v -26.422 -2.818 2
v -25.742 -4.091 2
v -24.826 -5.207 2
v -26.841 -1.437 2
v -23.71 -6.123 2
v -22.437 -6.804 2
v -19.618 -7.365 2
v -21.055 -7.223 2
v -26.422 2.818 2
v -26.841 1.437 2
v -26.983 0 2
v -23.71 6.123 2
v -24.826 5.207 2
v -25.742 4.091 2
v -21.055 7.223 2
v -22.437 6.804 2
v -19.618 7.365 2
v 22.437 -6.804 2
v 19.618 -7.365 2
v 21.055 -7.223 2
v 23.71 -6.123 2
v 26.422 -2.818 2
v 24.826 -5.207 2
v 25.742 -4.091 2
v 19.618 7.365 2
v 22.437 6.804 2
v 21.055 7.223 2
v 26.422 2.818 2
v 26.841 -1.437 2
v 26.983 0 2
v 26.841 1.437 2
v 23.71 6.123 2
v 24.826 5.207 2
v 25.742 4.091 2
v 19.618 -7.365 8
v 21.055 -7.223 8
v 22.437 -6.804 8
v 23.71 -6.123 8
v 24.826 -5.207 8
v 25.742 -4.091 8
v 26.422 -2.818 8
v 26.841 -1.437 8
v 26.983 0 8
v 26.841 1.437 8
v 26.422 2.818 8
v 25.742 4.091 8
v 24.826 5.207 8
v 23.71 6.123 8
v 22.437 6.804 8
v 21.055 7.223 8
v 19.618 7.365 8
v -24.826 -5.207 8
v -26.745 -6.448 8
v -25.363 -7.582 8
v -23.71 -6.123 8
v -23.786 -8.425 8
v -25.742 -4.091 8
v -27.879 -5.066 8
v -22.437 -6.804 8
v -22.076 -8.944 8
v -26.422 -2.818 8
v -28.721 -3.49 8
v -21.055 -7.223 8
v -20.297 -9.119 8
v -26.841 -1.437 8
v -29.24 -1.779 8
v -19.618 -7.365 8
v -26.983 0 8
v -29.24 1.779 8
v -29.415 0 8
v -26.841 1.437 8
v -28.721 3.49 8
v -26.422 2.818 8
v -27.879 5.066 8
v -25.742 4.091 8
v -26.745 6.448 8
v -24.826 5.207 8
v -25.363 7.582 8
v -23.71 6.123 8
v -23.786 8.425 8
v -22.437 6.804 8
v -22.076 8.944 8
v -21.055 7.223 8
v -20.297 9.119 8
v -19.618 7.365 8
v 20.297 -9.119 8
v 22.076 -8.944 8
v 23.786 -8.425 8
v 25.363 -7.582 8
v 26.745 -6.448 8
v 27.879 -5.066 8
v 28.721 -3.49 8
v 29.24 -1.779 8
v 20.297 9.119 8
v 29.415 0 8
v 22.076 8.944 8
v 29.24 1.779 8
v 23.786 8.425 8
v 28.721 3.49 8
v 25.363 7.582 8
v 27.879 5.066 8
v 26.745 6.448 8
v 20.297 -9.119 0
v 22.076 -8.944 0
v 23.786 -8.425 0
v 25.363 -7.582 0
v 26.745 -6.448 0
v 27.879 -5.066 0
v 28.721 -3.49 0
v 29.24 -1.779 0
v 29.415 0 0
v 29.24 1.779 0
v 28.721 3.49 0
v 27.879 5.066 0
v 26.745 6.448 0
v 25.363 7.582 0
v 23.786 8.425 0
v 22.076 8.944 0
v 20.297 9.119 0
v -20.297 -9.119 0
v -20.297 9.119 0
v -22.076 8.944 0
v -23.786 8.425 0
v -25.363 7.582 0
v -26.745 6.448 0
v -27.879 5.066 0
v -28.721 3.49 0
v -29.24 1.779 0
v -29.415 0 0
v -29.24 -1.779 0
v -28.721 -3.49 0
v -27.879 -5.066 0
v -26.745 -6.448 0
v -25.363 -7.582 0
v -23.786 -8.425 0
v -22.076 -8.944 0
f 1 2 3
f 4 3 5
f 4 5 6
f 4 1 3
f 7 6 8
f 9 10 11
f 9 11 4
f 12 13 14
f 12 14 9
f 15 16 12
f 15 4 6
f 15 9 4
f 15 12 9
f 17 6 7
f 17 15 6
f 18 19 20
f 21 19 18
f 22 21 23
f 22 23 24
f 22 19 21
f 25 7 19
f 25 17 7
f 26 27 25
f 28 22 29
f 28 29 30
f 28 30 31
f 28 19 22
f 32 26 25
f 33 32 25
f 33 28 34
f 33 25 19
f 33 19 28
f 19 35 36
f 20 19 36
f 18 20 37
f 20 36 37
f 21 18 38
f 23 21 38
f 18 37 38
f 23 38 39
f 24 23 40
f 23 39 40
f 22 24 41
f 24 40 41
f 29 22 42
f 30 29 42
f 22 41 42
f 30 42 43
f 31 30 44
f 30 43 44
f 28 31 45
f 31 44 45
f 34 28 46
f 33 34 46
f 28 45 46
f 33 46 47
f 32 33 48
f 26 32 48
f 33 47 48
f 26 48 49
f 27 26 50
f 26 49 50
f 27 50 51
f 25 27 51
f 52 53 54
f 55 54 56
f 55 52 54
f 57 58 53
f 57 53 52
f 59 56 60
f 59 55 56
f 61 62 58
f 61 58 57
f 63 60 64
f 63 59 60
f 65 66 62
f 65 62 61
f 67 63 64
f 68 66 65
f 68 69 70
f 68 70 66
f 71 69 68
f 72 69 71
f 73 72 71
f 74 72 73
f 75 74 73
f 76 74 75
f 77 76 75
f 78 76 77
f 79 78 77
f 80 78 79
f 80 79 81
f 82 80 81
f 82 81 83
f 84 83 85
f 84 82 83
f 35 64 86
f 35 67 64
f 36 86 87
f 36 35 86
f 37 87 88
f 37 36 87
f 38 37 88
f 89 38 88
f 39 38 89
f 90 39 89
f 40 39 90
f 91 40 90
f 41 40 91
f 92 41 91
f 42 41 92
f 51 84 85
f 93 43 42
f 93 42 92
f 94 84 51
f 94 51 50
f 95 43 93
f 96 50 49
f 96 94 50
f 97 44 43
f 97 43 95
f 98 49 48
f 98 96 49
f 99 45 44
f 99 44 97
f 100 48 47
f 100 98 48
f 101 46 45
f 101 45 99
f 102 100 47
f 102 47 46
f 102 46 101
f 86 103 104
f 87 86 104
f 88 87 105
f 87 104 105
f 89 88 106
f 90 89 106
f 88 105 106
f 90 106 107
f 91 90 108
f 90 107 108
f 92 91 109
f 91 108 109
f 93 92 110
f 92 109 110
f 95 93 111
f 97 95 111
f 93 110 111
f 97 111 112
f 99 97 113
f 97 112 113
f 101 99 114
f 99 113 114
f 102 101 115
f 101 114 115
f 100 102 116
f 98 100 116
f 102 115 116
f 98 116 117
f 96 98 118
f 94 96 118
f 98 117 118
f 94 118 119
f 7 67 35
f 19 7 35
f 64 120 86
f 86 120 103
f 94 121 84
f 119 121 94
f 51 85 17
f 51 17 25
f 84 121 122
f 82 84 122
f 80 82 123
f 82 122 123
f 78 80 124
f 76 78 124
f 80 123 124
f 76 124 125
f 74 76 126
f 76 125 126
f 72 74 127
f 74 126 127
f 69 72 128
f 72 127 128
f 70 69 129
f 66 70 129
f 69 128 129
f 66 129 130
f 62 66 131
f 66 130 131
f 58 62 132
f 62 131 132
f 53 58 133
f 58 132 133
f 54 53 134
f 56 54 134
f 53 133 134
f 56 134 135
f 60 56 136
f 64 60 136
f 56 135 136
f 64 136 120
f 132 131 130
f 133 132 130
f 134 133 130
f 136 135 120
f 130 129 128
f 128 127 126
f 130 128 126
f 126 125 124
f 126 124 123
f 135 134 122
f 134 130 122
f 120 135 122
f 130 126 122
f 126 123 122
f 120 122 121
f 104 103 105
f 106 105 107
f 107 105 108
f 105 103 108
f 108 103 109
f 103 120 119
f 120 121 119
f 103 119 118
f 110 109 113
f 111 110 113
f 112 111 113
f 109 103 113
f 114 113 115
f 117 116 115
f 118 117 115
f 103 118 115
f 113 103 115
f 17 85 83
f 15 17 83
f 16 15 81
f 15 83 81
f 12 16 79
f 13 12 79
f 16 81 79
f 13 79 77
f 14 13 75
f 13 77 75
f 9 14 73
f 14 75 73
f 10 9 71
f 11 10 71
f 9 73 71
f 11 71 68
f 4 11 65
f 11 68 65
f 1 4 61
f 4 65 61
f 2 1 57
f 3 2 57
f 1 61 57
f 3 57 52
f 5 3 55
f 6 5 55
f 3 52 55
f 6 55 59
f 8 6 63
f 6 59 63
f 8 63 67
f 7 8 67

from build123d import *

# Parameters (mm, degrees)
F0_W     = 40.593308
F0_H     = 18.237574
F1_DEPTH = 8
F2_W     = 39.236986
F2_H     = 14.72901
F3_DEPTH = 6


with BuildPart() as f1:
    # F0 (on Top) → F1 (new body)
    with BuildSketch(Plane.XY):
        Rectangle(F0_W, F0_H)
        with BuildLine():
            Line((20.296654, 9.118787), (20.296654, -9.118787))
            ThreePointArc((20.296654, -9.118787), (29.415441, 0), (20.296654, 9.118787))
        make_face()
        with BuildLine():
            ThreePointArc((-20.296654, 9.118787), (-29.415441, 0), (-20.296654, -9.118787))
            Line((-20.296654, -9.118787), (-20.296654, 9.118787))
        make_face()
    extrude(amount=F1_DEPTH)

    # F2 (on face) → F3 (cut)
    with BuildSketch(Plane.XY.offset(8)):
        Rectangle(F2_W, F2_H)
        with BuildLine():
            Line((19.618493, 7.364505), (19.618493, -7.364505))
            ThreePointArc((19.618493, -7.364505), (26.982998, 0), (19.618493, 7.364505))
        make_face()
        with BuildLine():
            ThreePointArc((-19.618493, 7.364505), (-26.982998, 0), (-19.618493, -7.364505))
            Line((-19.618493, -7.364505), (-19.618493, 7.364505))
        make_face()
    extrude(amount=-F3_DEPTH, mode=Mode.SUBTRACT)


solid = f1.part
